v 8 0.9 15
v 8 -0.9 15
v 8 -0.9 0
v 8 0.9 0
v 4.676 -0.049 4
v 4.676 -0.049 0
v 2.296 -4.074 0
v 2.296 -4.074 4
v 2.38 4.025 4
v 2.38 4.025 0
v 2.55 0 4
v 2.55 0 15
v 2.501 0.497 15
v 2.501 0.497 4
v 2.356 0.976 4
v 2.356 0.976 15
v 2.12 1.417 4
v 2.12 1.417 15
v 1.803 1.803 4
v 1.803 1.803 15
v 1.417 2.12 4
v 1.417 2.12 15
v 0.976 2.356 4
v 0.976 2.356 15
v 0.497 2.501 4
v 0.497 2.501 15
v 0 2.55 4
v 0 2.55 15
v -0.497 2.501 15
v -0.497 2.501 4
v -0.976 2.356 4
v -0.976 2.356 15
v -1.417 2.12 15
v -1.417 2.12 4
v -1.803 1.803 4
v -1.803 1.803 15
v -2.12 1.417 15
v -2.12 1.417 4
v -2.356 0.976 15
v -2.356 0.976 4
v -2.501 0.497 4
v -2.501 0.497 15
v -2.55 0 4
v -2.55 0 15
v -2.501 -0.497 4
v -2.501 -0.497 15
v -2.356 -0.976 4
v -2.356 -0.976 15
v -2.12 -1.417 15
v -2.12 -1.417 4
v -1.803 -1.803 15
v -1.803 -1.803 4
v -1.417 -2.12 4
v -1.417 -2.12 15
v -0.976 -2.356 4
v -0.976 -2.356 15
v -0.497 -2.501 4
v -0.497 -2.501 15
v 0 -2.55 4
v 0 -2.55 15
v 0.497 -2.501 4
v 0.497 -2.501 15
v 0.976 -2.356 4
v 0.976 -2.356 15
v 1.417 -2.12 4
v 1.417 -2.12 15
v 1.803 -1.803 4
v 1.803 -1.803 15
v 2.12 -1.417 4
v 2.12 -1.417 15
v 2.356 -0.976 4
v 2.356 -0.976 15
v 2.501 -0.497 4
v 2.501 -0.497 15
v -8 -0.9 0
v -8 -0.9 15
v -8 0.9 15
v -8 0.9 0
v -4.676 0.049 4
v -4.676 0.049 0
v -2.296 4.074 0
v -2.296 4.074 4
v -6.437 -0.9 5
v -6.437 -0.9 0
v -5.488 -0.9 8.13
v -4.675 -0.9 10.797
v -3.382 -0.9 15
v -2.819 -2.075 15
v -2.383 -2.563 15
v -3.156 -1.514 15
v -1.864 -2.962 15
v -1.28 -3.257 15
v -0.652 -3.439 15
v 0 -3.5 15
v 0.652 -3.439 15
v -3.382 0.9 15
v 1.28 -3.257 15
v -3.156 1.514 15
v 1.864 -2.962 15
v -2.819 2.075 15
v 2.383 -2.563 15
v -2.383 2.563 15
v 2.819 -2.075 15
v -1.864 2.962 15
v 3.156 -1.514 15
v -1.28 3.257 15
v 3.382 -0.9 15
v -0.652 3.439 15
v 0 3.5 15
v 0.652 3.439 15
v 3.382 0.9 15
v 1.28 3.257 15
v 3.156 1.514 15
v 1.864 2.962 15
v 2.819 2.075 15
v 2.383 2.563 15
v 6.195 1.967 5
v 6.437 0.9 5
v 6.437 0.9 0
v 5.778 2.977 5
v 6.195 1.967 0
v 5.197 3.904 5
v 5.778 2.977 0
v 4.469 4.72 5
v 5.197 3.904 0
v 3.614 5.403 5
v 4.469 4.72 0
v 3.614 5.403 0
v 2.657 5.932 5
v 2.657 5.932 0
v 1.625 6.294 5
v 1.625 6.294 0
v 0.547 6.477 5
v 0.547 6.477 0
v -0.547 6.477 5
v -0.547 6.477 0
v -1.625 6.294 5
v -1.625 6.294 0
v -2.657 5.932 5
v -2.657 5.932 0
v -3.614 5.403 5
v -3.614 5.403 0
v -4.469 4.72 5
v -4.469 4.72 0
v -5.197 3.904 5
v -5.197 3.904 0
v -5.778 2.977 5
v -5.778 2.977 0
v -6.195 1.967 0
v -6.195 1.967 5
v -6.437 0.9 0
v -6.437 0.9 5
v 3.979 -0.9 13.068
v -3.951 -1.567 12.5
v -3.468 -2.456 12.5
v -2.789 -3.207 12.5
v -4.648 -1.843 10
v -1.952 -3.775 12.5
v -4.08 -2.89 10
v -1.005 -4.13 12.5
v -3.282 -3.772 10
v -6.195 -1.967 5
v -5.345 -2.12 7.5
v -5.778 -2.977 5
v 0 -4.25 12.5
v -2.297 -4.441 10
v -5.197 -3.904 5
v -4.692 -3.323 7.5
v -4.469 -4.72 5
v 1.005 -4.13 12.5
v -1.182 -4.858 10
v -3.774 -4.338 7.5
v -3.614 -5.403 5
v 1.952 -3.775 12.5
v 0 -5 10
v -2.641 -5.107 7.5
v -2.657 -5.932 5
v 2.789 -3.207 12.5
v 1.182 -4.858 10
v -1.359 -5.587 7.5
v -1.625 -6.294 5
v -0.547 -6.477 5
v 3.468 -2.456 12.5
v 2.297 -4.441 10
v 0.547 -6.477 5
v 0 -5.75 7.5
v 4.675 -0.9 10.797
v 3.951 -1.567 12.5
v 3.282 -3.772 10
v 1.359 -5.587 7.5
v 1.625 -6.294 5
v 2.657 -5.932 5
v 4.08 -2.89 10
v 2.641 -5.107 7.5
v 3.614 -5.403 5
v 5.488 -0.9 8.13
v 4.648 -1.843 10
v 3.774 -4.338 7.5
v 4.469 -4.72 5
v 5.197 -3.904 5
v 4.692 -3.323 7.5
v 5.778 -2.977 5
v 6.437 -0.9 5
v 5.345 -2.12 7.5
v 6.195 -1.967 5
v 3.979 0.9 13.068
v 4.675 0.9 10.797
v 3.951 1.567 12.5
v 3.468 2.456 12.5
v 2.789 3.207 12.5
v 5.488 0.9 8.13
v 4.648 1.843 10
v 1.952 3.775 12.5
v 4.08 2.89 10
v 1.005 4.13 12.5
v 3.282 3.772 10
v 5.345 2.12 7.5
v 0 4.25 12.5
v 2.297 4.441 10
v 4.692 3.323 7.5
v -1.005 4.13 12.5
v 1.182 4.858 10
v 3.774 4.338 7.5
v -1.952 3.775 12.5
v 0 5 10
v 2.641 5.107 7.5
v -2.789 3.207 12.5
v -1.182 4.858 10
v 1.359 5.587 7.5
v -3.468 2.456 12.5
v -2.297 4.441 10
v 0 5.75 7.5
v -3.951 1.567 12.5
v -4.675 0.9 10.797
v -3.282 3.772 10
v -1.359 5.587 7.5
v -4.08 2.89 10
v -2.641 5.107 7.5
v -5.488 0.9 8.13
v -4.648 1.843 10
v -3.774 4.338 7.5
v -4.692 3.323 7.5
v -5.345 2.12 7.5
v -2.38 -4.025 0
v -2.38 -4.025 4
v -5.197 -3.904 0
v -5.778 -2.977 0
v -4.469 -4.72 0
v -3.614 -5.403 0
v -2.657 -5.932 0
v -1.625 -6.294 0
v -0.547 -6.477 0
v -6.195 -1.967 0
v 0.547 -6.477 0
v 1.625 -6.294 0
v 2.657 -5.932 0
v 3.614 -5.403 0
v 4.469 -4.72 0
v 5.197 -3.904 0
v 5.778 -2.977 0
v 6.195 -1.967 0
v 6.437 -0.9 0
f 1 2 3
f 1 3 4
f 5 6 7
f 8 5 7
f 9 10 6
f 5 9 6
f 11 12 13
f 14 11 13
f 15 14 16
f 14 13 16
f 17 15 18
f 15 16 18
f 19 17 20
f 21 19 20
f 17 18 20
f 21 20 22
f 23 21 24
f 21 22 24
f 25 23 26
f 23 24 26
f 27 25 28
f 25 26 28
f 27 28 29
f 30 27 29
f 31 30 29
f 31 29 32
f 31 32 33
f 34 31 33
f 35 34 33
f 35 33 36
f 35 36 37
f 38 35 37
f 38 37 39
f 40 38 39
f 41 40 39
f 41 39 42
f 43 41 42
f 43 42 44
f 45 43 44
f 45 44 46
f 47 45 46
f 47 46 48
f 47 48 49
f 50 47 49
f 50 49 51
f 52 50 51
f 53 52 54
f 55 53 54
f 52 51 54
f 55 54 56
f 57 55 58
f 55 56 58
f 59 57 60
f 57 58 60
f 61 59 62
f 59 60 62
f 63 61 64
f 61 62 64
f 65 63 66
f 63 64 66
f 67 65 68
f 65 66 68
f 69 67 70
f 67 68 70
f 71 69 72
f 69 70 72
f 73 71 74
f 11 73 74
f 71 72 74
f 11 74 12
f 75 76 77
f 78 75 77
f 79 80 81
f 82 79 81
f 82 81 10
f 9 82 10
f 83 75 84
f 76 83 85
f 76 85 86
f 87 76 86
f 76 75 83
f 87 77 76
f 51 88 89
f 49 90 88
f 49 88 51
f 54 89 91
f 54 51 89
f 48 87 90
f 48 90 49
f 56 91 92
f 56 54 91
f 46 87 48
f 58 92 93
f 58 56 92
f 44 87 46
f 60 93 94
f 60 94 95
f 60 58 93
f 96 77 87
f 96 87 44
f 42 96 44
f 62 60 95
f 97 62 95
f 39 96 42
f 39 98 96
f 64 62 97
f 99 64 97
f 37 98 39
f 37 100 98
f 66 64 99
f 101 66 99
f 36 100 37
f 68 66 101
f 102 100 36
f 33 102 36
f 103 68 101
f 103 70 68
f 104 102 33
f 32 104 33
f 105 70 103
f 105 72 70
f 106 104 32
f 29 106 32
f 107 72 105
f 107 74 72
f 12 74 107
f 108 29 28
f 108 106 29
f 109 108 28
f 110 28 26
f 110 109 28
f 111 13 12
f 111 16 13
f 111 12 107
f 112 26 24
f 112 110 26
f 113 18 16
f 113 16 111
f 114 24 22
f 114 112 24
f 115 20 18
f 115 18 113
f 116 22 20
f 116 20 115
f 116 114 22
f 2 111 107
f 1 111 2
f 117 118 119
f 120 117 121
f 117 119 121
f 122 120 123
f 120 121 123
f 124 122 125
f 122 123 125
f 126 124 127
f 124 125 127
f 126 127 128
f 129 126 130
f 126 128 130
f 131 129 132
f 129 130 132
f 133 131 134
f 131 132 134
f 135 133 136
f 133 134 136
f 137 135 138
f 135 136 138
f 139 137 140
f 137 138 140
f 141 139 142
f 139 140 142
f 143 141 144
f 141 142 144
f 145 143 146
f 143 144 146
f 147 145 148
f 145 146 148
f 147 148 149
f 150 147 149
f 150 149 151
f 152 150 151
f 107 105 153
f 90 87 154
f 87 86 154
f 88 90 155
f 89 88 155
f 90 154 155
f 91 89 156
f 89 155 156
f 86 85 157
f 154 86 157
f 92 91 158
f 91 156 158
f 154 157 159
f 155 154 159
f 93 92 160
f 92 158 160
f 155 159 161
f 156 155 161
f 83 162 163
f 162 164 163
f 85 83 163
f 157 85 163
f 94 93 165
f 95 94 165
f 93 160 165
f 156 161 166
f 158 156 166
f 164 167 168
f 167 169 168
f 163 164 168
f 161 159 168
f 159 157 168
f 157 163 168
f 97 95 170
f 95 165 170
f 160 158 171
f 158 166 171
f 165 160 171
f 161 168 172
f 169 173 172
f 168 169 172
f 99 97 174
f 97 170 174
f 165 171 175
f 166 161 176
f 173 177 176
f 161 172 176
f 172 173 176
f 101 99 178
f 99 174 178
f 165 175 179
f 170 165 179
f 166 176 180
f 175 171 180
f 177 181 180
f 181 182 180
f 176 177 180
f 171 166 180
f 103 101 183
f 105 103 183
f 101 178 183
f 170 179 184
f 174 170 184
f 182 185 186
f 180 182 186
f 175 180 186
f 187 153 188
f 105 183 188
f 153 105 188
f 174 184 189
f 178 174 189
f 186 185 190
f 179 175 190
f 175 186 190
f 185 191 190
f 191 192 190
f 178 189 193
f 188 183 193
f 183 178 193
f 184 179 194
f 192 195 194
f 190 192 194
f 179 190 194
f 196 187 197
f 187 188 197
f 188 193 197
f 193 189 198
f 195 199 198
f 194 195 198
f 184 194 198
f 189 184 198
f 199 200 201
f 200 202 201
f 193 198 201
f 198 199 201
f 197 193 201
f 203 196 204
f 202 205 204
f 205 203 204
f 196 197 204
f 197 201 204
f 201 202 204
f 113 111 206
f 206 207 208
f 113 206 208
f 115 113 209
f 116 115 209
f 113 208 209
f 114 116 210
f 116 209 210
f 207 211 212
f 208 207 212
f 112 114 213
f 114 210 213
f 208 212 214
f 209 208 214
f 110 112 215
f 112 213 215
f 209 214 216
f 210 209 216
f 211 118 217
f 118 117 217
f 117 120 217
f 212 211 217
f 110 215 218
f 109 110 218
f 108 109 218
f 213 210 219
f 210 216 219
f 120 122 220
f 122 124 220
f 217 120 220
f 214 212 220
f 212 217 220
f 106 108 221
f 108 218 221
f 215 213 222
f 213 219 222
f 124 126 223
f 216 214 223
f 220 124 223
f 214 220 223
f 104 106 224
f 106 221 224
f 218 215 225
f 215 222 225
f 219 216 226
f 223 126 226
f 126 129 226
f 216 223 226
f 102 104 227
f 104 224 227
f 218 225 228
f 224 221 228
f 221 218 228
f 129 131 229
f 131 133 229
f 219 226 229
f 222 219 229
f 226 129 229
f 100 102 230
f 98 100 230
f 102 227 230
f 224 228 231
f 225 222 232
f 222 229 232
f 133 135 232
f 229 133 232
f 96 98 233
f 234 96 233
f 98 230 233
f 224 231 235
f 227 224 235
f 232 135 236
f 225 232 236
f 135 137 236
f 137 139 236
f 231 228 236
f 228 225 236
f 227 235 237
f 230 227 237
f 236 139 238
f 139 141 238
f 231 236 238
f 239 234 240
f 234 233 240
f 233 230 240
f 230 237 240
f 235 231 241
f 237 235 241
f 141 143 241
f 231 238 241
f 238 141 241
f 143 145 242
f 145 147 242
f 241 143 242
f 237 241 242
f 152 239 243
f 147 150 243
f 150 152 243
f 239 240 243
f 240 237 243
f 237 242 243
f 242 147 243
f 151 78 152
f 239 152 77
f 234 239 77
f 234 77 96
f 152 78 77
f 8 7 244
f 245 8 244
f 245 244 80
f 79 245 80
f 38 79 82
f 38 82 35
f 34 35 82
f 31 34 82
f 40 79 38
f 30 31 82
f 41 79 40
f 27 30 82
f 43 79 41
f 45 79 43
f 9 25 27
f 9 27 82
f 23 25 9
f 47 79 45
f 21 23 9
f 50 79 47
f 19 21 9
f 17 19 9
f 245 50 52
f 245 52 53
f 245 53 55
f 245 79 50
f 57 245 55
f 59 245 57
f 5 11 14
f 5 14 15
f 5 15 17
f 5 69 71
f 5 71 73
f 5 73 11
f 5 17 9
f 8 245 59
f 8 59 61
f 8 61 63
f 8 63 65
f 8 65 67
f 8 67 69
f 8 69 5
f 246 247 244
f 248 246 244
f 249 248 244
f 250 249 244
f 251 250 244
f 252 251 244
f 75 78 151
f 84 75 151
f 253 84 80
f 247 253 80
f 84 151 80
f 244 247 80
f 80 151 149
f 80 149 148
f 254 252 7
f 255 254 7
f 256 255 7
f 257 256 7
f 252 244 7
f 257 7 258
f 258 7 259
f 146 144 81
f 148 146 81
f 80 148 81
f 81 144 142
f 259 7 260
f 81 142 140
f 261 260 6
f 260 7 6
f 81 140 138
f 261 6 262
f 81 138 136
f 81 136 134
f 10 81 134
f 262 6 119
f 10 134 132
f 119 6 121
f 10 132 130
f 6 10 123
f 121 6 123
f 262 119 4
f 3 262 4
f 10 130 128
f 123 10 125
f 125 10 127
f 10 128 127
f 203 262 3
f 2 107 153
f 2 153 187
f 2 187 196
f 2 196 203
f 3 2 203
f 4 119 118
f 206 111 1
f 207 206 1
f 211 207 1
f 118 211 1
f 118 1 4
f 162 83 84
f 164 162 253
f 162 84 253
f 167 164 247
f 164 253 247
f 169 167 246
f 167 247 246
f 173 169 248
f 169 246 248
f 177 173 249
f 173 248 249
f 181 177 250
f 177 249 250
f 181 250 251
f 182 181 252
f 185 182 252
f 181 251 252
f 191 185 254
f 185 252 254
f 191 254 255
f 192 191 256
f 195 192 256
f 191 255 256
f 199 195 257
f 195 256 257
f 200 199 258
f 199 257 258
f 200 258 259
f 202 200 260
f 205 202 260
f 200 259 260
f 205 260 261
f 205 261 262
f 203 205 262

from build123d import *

# Parameters (mm, degrees)
F0_R     = 6.5
F1_DEPTH = 15
F2_SIZE2 = 10
F2_SIZE  = 3
F3_W     = 16
F3_H     = 1.8
F4_DEPTH = 15
F6_DEPTH = 4
F7_R     = 2.55
F8_DEPTH = 25


with BuildPart() as f1:
    # F0 (on Top) → F1 (new body)
    with BuildSketch(Plane.XY):
        Circle(F0_R)
    extrude(amount=F1_DEPTH)

    # F2
    f2_edges = [f1.edges().sort_by_distance(p)[0] for p in [
        (-6.5, 0, 15),
    ]]
    f2_side = f1.faces().sort_by_distance((0, 0, 15))[0]
    chamfer(f2_edges, length=F2_SIZE, length2=F2_SIZE2, reference=f2_side)

    # F3 (on face) → F4 (join)
    with BuildSketch(Plane.XY.offset(15)):
        Rectangle(F3_W, F3_H)
    extrude(amount=-F4_DEPTH)

    # F5 (on face) → F6 (cut)
    with BuildSketch(Plane(origin=(0, 0, 0), x_dir=(1, 0, 0), z_dir=(0, 0, -1))):
        Polygon((2.3803777429, -4.0253946143), (4.6762828677, 0.0487702888), (2.2959051248, 4.0741649031), (-2.3803777429, 4.0253946143), (-4.6762828677, -0.0487702888), (-2.2959051248, -4.0741649031), align=None)
    extrude(amount=-F6_DEPTH, mode=Mode.SUBTRACT)

    # F7 (on face) → F8 (cut)
    with BuildSketch(Plane.XY.offset(15)):
        Circle(F7_R)
    extrude(amount=-F8_DEPTH, mode=Mode.SUBTRACT)


solid = f1.part
